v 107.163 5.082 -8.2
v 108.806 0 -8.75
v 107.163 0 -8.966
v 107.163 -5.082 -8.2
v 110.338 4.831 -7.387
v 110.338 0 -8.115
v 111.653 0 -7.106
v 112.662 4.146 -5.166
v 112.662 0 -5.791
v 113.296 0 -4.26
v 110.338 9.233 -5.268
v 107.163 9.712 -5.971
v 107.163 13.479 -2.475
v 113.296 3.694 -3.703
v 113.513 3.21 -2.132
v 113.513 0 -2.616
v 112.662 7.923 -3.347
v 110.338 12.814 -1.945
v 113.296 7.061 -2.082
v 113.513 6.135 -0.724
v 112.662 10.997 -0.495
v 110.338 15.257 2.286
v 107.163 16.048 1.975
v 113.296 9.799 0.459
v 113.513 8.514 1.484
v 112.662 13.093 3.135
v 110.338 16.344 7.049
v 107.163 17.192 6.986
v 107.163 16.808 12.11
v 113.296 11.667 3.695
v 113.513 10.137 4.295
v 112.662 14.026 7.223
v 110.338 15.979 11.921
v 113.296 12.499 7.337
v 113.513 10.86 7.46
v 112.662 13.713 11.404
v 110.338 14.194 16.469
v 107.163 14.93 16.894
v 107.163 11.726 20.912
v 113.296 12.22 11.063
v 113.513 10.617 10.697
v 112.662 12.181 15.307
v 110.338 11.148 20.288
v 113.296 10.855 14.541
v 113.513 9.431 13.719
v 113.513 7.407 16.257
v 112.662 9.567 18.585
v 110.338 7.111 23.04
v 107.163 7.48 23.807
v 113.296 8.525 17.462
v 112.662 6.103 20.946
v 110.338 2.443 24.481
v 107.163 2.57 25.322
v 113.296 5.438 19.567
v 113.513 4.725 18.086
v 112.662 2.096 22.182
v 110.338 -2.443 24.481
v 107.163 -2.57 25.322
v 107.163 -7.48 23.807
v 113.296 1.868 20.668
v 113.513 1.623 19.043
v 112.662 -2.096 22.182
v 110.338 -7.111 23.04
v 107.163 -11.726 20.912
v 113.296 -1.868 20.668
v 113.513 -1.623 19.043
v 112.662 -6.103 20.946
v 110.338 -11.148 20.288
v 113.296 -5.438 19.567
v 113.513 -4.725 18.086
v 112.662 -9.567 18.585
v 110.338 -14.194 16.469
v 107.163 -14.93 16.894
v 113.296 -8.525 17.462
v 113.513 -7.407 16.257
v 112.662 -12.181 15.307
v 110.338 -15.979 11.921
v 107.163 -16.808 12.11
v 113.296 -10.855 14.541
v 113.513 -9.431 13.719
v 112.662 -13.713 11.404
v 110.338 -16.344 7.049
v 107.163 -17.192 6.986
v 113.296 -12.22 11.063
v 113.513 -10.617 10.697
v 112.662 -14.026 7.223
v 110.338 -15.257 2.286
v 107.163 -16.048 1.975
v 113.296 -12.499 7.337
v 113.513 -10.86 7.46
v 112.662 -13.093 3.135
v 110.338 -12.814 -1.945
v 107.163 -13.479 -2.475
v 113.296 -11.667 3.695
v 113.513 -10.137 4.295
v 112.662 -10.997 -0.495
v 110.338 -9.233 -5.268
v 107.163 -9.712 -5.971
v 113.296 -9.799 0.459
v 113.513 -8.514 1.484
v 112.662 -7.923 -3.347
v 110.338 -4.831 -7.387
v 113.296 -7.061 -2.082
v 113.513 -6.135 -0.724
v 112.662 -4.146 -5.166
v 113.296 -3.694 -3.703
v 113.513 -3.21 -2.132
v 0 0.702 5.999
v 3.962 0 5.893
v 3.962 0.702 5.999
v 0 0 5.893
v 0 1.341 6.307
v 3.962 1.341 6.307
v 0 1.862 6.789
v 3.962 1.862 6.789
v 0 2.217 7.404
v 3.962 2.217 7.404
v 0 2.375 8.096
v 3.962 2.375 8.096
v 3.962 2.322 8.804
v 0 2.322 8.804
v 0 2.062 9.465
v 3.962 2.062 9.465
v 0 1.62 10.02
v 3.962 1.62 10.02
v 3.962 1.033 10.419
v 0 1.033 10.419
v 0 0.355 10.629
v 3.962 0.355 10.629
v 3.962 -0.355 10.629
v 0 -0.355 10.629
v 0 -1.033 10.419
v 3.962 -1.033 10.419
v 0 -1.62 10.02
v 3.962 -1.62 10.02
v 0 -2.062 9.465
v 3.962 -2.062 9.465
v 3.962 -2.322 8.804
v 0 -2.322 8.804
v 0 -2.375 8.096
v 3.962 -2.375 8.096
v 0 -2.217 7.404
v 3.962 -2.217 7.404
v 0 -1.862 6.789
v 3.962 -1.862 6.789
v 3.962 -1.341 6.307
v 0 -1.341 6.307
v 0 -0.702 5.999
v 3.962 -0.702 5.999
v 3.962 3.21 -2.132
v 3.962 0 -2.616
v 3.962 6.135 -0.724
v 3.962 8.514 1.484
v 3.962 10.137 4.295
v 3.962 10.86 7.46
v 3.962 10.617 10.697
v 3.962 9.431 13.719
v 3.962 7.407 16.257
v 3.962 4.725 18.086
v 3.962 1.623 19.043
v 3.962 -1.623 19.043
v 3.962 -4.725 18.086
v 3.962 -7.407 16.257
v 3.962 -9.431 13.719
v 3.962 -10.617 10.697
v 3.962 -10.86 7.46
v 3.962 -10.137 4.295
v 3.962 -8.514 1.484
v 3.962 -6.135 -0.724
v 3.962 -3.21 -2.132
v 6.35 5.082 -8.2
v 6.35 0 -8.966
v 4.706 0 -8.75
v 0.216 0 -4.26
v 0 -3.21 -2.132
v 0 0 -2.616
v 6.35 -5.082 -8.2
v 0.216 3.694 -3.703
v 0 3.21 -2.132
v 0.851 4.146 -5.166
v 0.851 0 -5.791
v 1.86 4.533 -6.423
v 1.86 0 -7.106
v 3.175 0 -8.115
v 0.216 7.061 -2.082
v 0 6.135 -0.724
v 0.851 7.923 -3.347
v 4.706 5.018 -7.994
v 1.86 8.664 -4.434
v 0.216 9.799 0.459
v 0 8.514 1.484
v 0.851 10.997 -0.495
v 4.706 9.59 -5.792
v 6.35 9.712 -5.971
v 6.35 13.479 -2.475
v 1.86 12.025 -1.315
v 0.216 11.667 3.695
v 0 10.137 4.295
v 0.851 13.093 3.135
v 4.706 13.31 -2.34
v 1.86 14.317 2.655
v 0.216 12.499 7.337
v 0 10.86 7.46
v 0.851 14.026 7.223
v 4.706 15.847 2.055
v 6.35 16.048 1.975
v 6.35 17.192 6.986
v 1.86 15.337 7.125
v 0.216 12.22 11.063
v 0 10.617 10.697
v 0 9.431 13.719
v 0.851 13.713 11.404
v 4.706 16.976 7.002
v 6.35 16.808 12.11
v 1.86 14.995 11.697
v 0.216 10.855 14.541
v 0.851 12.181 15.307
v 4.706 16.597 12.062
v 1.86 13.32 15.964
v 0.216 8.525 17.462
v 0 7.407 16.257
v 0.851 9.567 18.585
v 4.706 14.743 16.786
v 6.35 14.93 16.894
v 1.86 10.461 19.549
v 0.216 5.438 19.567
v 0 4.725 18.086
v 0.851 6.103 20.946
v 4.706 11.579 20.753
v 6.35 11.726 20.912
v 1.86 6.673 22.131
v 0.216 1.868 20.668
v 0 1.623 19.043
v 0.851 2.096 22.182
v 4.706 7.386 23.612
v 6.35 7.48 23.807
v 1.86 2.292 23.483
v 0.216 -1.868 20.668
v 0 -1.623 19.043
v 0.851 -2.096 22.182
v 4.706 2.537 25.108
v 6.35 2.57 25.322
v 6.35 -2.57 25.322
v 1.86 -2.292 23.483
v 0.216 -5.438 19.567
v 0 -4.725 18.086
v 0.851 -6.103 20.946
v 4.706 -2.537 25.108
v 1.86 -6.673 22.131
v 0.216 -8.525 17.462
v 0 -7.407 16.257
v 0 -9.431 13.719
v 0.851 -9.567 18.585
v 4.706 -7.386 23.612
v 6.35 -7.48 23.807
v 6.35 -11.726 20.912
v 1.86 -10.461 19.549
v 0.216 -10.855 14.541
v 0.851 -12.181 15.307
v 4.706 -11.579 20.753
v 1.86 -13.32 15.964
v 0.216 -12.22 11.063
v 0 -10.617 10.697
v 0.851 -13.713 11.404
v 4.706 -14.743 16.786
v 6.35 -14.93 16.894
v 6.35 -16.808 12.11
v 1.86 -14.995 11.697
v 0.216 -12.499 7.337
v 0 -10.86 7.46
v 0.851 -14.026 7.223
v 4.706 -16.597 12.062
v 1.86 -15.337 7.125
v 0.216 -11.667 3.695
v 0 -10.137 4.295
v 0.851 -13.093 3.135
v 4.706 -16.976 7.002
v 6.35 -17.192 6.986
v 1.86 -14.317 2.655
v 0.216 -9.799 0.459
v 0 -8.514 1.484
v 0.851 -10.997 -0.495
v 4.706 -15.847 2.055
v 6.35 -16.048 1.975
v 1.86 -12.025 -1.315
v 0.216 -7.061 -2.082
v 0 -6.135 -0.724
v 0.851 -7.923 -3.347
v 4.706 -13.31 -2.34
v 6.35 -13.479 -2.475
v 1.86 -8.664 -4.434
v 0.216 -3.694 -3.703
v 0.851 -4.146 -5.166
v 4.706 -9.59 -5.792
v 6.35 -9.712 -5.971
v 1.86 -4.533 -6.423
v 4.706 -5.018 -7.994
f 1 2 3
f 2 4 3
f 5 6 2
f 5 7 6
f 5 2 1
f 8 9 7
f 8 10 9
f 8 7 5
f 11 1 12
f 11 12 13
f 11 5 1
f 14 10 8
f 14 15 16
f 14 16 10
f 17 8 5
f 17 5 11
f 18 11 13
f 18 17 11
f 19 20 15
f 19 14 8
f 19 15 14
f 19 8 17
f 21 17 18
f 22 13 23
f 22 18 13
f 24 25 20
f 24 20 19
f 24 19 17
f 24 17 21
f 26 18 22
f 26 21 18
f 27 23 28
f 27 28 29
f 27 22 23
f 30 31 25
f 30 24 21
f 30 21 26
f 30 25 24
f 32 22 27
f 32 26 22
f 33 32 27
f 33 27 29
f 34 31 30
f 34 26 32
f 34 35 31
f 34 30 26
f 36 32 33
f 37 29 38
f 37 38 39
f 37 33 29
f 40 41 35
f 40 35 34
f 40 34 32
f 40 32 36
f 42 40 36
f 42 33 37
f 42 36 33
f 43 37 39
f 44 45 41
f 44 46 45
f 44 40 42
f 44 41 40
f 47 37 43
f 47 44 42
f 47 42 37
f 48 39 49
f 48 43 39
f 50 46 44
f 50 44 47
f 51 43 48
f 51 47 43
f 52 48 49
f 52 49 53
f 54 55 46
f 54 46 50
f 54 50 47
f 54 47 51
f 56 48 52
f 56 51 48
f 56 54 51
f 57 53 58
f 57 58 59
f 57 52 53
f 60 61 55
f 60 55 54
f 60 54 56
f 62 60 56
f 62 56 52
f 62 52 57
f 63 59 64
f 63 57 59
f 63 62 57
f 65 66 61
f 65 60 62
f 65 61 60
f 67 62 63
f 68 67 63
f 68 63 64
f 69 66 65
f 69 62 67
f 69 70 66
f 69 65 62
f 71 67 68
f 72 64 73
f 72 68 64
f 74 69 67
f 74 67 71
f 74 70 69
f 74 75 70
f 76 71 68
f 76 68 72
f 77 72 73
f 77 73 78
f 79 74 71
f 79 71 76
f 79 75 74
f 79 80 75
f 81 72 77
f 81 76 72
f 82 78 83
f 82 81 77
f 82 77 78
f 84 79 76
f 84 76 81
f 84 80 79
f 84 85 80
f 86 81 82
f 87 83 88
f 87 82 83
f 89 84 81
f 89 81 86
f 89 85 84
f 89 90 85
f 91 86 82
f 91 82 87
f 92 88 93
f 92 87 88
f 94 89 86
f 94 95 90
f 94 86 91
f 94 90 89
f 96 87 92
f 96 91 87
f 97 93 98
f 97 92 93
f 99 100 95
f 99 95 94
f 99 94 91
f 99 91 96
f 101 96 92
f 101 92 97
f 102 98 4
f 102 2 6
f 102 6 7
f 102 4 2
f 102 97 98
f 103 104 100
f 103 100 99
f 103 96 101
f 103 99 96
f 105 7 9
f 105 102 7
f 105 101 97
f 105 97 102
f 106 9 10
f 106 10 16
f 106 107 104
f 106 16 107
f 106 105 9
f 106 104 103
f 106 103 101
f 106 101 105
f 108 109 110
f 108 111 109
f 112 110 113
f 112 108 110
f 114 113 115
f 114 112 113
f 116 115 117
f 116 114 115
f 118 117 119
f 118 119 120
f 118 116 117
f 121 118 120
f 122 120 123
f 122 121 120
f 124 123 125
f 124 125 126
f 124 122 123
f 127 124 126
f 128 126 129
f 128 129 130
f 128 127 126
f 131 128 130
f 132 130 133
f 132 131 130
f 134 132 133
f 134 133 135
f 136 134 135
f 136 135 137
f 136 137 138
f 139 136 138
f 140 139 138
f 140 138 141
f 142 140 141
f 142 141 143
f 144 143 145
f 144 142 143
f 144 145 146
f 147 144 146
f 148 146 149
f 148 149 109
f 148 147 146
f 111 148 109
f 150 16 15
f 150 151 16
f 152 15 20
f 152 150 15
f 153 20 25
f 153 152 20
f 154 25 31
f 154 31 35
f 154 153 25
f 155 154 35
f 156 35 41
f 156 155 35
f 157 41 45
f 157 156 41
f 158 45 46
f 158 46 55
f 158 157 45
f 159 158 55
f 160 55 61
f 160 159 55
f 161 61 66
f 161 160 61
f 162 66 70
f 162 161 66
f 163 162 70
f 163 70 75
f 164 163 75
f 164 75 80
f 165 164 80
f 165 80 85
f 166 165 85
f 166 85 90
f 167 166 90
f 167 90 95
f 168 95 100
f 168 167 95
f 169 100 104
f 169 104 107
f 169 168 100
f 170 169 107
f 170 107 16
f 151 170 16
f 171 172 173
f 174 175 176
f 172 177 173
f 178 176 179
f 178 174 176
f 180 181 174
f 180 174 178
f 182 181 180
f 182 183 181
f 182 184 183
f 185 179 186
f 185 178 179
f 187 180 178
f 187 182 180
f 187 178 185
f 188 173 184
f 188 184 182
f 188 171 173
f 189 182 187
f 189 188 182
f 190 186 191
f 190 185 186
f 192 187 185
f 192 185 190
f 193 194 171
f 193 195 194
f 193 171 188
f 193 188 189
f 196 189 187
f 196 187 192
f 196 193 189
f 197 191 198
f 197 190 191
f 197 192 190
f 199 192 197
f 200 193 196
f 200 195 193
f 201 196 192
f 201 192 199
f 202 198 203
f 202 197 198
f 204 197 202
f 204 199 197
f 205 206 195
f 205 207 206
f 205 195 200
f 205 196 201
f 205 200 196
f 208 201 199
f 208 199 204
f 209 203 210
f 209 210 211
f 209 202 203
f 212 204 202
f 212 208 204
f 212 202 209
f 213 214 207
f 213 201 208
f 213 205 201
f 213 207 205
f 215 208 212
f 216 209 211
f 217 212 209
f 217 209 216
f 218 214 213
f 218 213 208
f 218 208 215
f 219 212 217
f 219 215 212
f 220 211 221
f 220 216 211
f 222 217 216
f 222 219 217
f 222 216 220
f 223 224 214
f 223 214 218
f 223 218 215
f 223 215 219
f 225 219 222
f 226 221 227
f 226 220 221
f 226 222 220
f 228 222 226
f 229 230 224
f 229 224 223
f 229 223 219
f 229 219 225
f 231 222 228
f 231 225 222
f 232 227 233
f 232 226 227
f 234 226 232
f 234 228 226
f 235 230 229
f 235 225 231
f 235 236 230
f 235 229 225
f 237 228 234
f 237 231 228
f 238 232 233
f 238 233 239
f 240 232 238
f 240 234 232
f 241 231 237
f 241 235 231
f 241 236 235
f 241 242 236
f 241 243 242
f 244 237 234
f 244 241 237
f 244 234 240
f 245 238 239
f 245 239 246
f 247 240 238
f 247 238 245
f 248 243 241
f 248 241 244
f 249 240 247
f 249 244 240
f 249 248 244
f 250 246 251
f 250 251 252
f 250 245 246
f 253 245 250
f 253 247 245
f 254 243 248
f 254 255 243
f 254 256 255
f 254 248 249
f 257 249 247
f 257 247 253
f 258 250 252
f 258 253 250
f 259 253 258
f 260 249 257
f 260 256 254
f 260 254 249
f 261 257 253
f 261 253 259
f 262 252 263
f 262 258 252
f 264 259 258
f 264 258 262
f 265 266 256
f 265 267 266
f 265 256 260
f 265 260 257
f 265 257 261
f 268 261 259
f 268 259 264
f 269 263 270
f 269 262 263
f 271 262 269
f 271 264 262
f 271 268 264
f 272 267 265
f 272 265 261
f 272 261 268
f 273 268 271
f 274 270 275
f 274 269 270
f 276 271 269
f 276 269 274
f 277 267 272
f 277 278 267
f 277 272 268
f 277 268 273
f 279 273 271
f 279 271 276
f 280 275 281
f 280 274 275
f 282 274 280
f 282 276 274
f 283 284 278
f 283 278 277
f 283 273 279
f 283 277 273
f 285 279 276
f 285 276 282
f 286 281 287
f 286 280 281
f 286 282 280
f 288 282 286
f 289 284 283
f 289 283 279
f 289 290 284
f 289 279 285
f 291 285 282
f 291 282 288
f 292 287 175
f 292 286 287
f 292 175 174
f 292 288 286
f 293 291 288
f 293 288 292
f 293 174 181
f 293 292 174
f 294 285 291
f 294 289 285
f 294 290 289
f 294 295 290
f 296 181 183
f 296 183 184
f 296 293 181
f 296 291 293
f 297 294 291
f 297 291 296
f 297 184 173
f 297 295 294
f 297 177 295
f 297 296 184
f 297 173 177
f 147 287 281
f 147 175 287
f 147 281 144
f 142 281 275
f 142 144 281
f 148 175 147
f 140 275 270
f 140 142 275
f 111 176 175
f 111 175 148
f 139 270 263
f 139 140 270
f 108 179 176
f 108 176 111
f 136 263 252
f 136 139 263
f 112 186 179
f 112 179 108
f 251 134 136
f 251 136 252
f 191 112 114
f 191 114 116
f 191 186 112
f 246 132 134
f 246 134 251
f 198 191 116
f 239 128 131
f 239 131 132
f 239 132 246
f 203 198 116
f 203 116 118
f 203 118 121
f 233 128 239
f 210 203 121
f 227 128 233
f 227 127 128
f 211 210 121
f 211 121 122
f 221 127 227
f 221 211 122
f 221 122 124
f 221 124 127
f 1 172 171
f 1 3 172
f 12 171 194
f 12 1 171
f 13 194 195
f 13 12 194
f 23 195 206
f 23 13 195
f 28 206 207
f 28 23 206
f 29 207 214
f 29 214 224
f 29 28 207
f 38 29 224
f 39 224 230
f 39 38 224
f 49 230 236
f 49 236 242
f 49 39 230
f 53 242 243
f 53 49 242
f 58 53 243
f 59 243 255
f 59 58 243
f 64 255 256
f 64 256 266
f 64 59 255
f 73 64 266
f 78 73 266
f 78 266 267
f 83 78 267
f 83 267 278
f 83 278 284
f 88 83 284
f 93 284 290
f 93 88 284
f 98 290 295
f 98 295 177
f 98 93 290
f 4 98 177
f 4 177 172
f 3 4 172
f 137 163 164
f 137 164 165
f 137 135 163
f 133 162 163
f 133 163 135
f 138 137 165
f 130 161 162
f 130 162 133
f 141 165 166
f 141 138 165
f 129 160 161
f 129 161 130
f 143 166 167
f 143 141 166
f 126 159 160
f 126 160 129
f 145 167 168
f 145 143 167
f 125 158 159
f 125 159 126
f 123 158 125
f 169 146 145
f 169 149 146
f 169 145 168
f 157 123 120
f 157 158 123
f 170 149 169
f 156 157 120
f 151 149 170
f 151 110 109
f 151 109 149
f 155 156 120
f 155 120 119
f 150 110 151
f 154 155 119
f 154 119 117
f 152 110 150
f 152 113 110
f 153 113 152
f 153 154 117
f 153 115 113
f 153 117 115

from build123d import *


with BuildPart() as f1:
    # F0 (on Front) → F1 (revolve)
    with BuildSketch(Plane.XZ):
        with BuildLine():
            ThreePointArc((0, -2.6162), (1.859872, -7.106328), (6.35, -8.9662))
            Line((6.35, -8.9662), (107.1626, -8.9662))
            ThreePointArc((107.1626, -8.9662), (111.652728, -7.106328), (113.5126, -2.6162))
            Line((113.5126, -2.6162), (3.9624, -2.6162))
            Line((3.9624, -2.6162), (3.9624, 5.8928))
            Line((3.9624, 5.8928), (0, 5.8928))
            Line((0, 5.8928), (0, -2.6162))
        make_face()
    revolve(axis=Axis((12.4968, 0, 8.27405), (1, 0, 0)))


solid = f1.part
